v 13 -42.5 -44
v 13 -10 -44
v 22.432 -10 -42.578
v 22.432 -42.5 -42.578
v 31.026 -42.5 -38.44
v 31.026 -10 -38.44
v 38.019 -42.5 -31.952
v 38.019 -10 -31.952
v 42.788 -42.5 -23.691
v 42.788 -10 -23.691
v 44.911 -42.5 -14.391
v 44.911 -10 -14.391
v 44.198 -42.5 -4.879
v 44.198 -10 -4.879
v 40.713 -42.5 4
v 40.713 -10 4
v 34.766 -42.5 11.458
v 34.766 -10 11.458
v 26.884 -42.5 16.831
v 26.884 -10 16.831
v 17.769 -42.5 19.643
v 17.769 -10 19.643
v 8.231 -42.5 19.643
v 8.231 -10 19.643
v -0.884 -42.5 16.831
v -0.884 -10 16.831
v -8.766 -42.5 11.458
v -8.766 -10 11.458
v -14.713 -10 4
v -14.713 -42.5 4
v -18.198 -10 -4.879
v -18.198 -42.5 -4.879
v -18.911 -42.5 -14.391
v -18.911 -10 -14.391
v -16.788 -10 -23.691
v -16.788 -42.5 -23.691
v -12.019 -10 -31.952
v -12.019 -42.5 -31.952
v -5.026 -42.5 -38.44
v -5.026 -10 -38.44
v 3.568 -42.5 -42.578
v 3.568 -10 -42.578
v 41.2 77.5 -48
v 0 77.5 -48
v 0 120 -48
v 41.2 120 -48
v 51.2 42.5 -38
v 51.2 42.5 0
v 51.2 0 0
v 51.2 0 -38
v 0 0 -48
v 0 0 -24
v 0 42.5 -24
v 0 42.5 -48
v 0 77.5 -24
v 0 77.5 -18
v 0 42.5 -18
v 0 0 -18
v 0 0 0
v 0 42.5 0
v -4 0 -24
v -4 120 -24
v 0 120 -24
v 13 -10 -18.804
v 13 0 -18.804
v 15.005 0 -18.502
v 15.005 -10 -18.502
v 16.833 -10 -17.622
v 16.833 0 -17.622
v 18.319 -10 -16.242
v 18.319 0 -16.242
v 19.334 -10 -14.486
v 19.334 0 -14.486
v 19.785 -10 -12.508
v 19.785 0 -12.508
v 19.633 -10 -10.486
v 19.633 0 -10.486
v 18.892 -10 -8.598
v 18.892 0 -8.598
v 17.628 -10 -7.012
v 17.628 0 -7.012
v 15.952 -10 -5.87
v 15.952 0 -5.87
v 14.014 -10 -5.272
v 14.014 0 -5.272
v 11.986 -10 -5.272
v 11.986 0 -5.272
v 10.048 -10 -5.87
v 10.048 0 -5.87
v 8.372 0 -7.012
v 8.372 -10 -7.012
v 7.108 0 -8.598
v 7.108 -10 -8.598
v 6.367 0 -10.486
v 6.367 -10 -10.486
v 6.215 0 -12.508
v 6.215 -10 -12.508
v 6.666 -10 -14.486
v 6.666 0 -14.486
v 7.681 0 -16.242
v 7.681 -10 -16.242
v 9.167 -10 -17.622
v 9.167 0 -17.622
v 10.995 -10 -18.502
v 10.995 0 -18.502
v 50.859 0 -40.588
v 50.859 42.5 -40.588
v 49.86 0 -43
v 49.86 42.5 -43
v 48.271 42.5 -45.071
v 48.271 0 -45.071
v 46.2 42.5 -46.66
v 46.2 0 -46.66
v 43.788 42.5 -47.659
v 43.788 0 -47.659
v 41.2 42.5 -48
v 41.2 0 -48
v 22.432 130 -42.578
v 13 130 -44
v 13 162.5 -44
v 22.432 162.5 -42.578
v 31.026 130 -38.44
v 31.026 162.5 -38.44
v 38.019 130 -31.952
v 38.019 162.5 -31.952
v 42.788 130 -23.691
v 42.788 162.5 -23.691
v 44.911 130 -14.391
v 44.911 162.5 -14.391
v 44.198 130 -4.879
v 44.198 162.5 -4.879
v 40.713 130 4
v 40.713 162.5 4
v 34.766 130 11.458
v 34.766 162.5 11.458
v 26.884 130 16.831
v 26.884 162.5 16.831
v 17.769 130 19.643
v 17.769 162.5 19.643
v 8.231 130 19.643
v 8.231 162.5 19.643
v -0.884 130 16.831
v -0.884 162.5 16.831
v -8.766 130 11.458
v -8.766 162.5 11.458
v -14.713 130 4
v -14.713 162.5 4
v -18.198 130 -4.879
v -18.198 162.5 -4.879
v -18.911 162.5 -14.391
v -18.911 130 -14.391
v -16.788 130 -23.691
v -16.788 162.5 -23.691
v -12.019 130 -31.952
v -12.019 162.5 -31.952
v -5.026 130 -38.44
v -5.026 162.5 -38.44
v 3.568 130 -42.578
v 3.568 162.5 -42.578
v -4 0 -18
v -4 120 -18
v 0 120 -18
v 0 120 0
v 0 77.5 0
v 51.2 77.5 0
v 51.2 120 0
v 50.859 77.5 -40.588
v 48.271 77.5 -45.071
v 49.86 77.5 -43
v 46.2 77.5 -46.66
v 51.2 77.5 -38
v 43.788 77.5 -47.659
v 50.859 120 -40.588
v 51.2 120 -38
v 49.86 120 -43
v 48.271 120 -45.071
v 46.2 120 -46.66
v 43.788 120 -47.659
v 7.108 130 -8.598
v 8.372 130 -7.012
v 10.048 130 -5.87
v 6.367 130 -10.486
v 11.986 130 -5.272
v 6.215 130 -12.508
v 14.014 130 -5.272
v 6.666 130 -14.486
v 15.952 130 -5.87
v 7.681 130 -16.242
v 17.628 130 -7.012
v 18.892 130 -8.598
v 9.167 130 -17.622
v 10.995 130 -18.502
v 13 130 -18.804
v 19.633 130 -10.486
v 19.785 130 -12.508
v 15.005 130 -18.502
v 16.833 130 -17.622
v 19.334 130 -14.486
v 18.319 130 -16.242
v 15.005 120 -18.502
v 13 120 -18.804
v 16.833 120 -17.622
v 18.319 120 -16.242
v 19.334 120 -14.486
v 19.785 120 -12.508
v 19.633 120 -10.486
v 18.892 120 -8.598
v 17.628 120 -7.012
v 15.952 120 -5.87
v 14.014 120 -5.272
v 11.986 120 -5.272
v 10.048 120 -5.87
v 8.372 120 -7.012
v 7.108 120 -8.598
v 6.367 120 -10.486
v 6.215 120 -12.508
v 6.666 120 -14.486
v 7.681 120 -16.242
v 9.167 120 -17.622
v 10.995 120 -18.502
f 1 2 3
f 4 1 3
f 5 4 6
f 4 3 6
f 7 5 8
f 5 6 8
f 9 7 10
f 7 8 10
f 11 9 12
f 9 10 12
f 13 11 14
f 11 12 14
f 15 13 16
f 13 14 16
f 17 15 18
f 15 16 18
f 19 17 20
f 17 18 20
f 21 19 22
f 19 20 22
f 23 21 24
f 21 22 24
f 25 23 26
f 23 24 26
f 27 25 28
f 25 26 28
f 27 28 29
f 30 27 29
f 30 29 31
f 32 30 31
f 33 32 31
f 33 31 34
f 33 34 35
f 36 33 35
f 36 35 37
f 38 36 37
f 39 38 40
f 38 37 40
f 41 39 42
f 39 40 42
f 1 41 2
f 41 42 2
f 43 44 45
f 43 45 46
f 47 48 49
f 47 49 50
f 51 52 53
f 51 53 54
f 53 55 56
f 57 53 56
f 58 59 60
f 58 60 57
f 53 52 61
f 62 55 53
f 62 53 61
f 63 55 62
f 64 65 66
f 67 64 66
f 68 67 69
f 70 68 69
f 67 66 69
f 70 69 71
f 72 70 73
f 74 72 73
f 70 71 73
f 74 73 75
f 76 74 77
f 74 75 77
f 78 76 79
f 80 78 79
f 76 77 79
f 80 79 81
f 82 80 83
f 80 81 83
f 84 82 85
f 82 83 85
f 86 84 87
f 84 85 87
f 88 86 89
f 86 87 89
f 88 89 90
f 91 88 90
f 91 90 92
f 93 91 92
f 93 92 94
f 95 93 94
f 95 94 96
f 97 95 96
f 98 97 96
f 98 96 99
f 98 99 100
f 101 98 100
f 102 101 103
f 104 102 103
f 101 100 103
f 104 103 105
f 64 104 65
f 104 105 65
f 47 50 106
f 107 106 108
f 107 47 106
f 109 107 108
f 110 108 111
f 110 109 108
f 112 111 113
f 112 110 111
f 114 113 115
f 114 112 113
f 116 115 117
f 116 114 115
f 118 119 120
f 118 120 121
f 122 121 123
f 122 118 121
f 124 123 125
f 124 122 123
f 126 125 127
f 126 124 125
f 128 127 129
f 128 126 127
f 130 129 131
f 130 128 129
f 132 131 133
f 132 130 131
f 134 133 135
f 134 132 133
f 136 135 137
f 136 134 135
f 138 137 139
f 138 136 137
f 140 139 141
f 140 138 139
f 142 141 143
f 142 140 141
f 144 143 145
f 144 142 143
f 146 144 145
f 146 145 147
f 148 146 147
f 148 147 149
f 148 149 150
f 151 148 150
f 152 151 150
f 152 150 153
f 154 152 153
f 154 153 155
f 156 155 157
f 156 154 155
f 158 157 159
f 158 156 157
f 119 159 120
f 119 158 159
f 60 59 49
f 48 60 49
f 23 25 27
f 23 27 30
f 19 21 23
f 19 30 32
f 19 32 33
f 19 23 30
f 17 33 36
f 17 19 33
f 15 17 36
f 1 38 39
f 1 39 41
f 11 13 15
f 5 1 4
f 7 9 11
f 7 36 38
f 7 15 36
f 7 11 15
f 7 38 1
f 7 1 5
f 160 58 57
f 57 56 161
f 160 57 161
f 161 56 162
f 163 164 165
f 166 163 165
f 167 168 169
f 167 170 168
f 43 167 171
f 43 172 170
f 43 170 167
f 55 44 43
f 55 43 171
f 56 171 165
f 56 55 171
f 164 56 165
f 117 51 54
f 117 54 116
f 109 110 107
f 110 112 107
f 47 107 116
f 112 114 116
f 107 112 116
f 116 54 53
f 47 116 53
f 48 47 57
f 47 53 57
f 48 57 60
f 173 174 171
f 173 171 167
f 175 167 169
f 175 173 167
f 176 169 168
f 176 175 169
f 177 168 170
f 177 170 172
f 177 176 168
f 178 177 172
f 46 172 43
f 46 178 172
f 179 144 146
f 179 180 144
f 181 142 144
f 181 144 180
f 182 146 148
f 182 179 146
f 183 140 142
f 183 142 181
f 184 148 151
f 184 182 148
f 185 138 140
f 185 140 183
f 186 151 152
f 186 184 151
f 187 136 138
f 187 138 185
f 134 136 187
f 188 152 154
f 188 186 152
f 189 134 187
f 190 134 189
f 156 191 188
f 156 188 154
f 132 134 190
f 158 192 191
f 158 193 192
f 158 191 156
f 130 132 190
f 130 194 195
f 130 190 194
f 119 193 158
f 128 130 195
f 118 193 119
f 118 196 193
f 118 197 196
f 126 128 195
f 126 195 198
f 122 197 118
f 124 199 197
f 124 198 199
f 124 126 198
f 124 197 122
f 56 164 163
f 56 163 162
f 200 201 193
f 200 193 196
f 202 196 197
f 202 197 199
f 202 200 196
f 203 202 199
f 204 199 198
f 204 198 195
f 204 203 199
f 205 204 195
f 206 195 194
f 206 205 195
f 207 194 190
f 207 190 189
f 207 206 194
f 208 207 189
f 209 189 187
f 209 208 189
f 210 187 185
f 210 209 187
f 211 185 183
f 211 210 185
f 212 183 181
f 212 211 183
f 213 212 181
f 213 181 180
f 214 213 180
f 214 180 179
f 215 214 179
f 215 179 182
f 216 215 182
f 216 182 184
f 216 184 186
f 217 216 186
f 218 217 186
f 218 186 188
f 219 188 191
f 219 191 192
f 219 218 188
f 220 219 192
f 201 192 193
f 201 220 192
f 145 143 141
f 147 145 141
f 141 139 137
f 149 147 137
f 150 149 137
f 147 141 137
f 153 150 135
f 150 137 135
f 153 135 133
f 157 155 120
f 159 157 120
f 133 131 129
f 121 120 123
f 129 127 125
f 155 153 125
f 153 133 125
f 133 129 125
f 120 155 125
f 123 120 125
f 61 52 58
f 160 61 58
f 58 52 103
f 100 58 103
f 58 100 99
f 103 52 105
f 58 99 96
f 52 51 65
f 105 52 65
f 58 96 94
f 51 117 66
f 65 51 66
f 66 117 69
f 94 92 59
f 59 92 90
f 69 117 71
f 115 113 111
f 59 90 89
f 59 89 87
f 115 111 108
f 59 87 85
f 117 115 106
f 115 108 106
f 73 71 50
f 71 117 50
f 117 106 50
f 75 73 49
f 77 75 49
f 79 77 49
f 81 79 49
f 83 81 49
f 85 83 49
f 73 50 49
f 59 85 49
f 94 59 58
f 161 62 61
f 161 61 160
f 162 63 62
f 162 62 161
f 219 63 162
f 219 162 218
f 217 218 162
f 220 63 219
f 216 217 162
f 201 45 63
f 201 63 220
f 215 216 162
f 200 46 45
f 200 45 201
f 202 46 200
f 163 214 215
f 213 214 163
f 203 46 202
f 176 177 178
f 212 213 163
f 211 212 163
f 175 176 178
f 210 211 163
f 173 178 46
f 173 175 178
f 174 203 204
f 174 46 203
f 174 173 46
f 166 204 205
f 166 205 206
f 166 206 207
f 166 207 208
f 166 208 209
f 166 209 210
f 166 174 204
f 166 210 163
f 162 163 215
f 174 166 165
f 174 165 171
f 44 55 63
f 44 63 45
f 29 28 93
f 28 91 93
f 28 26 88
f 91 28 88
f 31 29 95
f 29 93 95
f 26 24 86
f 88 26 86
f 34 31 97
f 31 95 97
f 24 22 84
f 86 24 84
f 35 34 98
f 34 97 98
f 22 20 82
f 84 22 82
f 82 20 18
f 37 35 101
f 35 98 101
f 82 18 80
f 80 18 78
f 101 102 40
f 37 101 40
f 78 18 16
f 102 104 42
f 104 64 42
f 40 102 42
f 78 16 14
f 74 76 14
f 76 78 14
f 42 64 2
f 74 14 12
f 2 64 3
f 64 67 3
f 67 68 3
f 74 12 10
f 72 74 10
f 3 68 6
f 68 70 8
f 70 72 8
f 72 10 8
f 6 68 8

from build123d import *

# Parameters (mm, degrees)
SKETCH_1_W          = 51.2
SKETCH_1_H          = 48
EXTRUDE_1_DEPTH     = 120
FILLET_1_R          = 10
SKETCH_3_R          = 6.803864169
EXTRUDE_2_DEPTH     = 10
SKETCH_4_R          = 32
EXTRUDE_3_DEPTH     = 32.5
SKETCH_5_W          = 48
SKETCH_5_H          = 35
CUT_EXTRUDE_1_DEPTH = 178.007598707
SKETCH_6_W          = 6
SKETCH_6_H          = 120
EXTRUDE_6_DEPTH     = 4


with BuildPart() as part:
    # 草图1 → 凸台-拉伸1 (new body)
    with BuildSketch(Plane(origin=(0, 0, 0), x_dir=(1, 0, 0), z_dir=(0, 1, 0))):
        with Locations((25.6, 24)):
            Rectangle(SKETCH_1_W, SKETCH_1_H)
    extrude(amount=EXTRUDE_1_DEPTH)

    # 圆角1
    fillet_1_edges = [part.edges().sort_by_distance(p)[0] for p in [
        (51.2, 60, -48),
    ]]
    fillet(fillet_1_edges, radius=FILLET_1_R)

    # 草图3 → 凸台-拉伸2 (add)
    with BuildSketch(Plane.XZ):
        with Locations(Location((13, -12, 0), (0, 0, 270))):
            Circle(SKETCH_3_R)
    extrude_2 = extrude(amount=EXTRUDE_2_DEPTH)

    # 草图4 → 凸台-拉伸3 (add)
    with BuildSketch(Plane.XZ.offset(10)):
        with Locations(Location((13, -12, 0), (0, 0, 270))):
            Circle(SKETCH_4_R)
    extrude_3 = extrude(amount=EXTRUDE_3_DEPTH)

    # 镜向1: 凸台-拉伸2, 凸台-拉伸3 across plane
    add(extrude_2.mirror(Plane(origin=(0, 60, 0), x_dir=(0, 0, 1), z_dir=(0, -1, 0))))
    add(extrude_3.mirror(Plane(origin=(0, 60, 0), x_dir=(0, 0, 1), z_dir=(0, -1, 0))))

    # 草图5 → 切除-拉伸1 (cut, through all)
    with BuildSketch(Plane.ZY):
        with Locations((-24, 60)):
            Rectangle(SKETCH_5_W, SKETCH_5_H)
    extrude(amount=-CUT_EXTRUDE_1_DEPTH, mode=Mode.SUBTRACT)


with BuildPart() as cut_extrude_1_piece_1:
    # of the separate pieces the step leaves, piece 1, a body of its own (cut_extrude_1_pieces)
    add(part.part.solids().sort_by_distance((13, 130, -44))[0])



with BuildPart() as cut_extrude_1_piece_2:
    # of the separate pieces the step leaves, piece 2, a body of its own (cut_extrude_1_pieces)
    add(part.part.solids().sort_by_distance((51.2, 0, -38))[0])


with BuildPart() as cut_extrude_1_piece_1_1:
    add(cut_extrude_1_piece_1.part)

    add(cut_extrude_1_piece_2.part)  # 凸台-拉伸6 merges 切除-拉伸1 piece 2
    # 草图6 → 凸台-拉伸6 (add)
    with BuildSketch(Plane.ZY):
        with Locations((-21, 60)):
            Rectangle(SKETCH_6_W, SKETCH_6_H)
    extrude(amount=EXTRUDE_6_DEPTH)


solid = cut_extrude_1_piece_1_1.part
